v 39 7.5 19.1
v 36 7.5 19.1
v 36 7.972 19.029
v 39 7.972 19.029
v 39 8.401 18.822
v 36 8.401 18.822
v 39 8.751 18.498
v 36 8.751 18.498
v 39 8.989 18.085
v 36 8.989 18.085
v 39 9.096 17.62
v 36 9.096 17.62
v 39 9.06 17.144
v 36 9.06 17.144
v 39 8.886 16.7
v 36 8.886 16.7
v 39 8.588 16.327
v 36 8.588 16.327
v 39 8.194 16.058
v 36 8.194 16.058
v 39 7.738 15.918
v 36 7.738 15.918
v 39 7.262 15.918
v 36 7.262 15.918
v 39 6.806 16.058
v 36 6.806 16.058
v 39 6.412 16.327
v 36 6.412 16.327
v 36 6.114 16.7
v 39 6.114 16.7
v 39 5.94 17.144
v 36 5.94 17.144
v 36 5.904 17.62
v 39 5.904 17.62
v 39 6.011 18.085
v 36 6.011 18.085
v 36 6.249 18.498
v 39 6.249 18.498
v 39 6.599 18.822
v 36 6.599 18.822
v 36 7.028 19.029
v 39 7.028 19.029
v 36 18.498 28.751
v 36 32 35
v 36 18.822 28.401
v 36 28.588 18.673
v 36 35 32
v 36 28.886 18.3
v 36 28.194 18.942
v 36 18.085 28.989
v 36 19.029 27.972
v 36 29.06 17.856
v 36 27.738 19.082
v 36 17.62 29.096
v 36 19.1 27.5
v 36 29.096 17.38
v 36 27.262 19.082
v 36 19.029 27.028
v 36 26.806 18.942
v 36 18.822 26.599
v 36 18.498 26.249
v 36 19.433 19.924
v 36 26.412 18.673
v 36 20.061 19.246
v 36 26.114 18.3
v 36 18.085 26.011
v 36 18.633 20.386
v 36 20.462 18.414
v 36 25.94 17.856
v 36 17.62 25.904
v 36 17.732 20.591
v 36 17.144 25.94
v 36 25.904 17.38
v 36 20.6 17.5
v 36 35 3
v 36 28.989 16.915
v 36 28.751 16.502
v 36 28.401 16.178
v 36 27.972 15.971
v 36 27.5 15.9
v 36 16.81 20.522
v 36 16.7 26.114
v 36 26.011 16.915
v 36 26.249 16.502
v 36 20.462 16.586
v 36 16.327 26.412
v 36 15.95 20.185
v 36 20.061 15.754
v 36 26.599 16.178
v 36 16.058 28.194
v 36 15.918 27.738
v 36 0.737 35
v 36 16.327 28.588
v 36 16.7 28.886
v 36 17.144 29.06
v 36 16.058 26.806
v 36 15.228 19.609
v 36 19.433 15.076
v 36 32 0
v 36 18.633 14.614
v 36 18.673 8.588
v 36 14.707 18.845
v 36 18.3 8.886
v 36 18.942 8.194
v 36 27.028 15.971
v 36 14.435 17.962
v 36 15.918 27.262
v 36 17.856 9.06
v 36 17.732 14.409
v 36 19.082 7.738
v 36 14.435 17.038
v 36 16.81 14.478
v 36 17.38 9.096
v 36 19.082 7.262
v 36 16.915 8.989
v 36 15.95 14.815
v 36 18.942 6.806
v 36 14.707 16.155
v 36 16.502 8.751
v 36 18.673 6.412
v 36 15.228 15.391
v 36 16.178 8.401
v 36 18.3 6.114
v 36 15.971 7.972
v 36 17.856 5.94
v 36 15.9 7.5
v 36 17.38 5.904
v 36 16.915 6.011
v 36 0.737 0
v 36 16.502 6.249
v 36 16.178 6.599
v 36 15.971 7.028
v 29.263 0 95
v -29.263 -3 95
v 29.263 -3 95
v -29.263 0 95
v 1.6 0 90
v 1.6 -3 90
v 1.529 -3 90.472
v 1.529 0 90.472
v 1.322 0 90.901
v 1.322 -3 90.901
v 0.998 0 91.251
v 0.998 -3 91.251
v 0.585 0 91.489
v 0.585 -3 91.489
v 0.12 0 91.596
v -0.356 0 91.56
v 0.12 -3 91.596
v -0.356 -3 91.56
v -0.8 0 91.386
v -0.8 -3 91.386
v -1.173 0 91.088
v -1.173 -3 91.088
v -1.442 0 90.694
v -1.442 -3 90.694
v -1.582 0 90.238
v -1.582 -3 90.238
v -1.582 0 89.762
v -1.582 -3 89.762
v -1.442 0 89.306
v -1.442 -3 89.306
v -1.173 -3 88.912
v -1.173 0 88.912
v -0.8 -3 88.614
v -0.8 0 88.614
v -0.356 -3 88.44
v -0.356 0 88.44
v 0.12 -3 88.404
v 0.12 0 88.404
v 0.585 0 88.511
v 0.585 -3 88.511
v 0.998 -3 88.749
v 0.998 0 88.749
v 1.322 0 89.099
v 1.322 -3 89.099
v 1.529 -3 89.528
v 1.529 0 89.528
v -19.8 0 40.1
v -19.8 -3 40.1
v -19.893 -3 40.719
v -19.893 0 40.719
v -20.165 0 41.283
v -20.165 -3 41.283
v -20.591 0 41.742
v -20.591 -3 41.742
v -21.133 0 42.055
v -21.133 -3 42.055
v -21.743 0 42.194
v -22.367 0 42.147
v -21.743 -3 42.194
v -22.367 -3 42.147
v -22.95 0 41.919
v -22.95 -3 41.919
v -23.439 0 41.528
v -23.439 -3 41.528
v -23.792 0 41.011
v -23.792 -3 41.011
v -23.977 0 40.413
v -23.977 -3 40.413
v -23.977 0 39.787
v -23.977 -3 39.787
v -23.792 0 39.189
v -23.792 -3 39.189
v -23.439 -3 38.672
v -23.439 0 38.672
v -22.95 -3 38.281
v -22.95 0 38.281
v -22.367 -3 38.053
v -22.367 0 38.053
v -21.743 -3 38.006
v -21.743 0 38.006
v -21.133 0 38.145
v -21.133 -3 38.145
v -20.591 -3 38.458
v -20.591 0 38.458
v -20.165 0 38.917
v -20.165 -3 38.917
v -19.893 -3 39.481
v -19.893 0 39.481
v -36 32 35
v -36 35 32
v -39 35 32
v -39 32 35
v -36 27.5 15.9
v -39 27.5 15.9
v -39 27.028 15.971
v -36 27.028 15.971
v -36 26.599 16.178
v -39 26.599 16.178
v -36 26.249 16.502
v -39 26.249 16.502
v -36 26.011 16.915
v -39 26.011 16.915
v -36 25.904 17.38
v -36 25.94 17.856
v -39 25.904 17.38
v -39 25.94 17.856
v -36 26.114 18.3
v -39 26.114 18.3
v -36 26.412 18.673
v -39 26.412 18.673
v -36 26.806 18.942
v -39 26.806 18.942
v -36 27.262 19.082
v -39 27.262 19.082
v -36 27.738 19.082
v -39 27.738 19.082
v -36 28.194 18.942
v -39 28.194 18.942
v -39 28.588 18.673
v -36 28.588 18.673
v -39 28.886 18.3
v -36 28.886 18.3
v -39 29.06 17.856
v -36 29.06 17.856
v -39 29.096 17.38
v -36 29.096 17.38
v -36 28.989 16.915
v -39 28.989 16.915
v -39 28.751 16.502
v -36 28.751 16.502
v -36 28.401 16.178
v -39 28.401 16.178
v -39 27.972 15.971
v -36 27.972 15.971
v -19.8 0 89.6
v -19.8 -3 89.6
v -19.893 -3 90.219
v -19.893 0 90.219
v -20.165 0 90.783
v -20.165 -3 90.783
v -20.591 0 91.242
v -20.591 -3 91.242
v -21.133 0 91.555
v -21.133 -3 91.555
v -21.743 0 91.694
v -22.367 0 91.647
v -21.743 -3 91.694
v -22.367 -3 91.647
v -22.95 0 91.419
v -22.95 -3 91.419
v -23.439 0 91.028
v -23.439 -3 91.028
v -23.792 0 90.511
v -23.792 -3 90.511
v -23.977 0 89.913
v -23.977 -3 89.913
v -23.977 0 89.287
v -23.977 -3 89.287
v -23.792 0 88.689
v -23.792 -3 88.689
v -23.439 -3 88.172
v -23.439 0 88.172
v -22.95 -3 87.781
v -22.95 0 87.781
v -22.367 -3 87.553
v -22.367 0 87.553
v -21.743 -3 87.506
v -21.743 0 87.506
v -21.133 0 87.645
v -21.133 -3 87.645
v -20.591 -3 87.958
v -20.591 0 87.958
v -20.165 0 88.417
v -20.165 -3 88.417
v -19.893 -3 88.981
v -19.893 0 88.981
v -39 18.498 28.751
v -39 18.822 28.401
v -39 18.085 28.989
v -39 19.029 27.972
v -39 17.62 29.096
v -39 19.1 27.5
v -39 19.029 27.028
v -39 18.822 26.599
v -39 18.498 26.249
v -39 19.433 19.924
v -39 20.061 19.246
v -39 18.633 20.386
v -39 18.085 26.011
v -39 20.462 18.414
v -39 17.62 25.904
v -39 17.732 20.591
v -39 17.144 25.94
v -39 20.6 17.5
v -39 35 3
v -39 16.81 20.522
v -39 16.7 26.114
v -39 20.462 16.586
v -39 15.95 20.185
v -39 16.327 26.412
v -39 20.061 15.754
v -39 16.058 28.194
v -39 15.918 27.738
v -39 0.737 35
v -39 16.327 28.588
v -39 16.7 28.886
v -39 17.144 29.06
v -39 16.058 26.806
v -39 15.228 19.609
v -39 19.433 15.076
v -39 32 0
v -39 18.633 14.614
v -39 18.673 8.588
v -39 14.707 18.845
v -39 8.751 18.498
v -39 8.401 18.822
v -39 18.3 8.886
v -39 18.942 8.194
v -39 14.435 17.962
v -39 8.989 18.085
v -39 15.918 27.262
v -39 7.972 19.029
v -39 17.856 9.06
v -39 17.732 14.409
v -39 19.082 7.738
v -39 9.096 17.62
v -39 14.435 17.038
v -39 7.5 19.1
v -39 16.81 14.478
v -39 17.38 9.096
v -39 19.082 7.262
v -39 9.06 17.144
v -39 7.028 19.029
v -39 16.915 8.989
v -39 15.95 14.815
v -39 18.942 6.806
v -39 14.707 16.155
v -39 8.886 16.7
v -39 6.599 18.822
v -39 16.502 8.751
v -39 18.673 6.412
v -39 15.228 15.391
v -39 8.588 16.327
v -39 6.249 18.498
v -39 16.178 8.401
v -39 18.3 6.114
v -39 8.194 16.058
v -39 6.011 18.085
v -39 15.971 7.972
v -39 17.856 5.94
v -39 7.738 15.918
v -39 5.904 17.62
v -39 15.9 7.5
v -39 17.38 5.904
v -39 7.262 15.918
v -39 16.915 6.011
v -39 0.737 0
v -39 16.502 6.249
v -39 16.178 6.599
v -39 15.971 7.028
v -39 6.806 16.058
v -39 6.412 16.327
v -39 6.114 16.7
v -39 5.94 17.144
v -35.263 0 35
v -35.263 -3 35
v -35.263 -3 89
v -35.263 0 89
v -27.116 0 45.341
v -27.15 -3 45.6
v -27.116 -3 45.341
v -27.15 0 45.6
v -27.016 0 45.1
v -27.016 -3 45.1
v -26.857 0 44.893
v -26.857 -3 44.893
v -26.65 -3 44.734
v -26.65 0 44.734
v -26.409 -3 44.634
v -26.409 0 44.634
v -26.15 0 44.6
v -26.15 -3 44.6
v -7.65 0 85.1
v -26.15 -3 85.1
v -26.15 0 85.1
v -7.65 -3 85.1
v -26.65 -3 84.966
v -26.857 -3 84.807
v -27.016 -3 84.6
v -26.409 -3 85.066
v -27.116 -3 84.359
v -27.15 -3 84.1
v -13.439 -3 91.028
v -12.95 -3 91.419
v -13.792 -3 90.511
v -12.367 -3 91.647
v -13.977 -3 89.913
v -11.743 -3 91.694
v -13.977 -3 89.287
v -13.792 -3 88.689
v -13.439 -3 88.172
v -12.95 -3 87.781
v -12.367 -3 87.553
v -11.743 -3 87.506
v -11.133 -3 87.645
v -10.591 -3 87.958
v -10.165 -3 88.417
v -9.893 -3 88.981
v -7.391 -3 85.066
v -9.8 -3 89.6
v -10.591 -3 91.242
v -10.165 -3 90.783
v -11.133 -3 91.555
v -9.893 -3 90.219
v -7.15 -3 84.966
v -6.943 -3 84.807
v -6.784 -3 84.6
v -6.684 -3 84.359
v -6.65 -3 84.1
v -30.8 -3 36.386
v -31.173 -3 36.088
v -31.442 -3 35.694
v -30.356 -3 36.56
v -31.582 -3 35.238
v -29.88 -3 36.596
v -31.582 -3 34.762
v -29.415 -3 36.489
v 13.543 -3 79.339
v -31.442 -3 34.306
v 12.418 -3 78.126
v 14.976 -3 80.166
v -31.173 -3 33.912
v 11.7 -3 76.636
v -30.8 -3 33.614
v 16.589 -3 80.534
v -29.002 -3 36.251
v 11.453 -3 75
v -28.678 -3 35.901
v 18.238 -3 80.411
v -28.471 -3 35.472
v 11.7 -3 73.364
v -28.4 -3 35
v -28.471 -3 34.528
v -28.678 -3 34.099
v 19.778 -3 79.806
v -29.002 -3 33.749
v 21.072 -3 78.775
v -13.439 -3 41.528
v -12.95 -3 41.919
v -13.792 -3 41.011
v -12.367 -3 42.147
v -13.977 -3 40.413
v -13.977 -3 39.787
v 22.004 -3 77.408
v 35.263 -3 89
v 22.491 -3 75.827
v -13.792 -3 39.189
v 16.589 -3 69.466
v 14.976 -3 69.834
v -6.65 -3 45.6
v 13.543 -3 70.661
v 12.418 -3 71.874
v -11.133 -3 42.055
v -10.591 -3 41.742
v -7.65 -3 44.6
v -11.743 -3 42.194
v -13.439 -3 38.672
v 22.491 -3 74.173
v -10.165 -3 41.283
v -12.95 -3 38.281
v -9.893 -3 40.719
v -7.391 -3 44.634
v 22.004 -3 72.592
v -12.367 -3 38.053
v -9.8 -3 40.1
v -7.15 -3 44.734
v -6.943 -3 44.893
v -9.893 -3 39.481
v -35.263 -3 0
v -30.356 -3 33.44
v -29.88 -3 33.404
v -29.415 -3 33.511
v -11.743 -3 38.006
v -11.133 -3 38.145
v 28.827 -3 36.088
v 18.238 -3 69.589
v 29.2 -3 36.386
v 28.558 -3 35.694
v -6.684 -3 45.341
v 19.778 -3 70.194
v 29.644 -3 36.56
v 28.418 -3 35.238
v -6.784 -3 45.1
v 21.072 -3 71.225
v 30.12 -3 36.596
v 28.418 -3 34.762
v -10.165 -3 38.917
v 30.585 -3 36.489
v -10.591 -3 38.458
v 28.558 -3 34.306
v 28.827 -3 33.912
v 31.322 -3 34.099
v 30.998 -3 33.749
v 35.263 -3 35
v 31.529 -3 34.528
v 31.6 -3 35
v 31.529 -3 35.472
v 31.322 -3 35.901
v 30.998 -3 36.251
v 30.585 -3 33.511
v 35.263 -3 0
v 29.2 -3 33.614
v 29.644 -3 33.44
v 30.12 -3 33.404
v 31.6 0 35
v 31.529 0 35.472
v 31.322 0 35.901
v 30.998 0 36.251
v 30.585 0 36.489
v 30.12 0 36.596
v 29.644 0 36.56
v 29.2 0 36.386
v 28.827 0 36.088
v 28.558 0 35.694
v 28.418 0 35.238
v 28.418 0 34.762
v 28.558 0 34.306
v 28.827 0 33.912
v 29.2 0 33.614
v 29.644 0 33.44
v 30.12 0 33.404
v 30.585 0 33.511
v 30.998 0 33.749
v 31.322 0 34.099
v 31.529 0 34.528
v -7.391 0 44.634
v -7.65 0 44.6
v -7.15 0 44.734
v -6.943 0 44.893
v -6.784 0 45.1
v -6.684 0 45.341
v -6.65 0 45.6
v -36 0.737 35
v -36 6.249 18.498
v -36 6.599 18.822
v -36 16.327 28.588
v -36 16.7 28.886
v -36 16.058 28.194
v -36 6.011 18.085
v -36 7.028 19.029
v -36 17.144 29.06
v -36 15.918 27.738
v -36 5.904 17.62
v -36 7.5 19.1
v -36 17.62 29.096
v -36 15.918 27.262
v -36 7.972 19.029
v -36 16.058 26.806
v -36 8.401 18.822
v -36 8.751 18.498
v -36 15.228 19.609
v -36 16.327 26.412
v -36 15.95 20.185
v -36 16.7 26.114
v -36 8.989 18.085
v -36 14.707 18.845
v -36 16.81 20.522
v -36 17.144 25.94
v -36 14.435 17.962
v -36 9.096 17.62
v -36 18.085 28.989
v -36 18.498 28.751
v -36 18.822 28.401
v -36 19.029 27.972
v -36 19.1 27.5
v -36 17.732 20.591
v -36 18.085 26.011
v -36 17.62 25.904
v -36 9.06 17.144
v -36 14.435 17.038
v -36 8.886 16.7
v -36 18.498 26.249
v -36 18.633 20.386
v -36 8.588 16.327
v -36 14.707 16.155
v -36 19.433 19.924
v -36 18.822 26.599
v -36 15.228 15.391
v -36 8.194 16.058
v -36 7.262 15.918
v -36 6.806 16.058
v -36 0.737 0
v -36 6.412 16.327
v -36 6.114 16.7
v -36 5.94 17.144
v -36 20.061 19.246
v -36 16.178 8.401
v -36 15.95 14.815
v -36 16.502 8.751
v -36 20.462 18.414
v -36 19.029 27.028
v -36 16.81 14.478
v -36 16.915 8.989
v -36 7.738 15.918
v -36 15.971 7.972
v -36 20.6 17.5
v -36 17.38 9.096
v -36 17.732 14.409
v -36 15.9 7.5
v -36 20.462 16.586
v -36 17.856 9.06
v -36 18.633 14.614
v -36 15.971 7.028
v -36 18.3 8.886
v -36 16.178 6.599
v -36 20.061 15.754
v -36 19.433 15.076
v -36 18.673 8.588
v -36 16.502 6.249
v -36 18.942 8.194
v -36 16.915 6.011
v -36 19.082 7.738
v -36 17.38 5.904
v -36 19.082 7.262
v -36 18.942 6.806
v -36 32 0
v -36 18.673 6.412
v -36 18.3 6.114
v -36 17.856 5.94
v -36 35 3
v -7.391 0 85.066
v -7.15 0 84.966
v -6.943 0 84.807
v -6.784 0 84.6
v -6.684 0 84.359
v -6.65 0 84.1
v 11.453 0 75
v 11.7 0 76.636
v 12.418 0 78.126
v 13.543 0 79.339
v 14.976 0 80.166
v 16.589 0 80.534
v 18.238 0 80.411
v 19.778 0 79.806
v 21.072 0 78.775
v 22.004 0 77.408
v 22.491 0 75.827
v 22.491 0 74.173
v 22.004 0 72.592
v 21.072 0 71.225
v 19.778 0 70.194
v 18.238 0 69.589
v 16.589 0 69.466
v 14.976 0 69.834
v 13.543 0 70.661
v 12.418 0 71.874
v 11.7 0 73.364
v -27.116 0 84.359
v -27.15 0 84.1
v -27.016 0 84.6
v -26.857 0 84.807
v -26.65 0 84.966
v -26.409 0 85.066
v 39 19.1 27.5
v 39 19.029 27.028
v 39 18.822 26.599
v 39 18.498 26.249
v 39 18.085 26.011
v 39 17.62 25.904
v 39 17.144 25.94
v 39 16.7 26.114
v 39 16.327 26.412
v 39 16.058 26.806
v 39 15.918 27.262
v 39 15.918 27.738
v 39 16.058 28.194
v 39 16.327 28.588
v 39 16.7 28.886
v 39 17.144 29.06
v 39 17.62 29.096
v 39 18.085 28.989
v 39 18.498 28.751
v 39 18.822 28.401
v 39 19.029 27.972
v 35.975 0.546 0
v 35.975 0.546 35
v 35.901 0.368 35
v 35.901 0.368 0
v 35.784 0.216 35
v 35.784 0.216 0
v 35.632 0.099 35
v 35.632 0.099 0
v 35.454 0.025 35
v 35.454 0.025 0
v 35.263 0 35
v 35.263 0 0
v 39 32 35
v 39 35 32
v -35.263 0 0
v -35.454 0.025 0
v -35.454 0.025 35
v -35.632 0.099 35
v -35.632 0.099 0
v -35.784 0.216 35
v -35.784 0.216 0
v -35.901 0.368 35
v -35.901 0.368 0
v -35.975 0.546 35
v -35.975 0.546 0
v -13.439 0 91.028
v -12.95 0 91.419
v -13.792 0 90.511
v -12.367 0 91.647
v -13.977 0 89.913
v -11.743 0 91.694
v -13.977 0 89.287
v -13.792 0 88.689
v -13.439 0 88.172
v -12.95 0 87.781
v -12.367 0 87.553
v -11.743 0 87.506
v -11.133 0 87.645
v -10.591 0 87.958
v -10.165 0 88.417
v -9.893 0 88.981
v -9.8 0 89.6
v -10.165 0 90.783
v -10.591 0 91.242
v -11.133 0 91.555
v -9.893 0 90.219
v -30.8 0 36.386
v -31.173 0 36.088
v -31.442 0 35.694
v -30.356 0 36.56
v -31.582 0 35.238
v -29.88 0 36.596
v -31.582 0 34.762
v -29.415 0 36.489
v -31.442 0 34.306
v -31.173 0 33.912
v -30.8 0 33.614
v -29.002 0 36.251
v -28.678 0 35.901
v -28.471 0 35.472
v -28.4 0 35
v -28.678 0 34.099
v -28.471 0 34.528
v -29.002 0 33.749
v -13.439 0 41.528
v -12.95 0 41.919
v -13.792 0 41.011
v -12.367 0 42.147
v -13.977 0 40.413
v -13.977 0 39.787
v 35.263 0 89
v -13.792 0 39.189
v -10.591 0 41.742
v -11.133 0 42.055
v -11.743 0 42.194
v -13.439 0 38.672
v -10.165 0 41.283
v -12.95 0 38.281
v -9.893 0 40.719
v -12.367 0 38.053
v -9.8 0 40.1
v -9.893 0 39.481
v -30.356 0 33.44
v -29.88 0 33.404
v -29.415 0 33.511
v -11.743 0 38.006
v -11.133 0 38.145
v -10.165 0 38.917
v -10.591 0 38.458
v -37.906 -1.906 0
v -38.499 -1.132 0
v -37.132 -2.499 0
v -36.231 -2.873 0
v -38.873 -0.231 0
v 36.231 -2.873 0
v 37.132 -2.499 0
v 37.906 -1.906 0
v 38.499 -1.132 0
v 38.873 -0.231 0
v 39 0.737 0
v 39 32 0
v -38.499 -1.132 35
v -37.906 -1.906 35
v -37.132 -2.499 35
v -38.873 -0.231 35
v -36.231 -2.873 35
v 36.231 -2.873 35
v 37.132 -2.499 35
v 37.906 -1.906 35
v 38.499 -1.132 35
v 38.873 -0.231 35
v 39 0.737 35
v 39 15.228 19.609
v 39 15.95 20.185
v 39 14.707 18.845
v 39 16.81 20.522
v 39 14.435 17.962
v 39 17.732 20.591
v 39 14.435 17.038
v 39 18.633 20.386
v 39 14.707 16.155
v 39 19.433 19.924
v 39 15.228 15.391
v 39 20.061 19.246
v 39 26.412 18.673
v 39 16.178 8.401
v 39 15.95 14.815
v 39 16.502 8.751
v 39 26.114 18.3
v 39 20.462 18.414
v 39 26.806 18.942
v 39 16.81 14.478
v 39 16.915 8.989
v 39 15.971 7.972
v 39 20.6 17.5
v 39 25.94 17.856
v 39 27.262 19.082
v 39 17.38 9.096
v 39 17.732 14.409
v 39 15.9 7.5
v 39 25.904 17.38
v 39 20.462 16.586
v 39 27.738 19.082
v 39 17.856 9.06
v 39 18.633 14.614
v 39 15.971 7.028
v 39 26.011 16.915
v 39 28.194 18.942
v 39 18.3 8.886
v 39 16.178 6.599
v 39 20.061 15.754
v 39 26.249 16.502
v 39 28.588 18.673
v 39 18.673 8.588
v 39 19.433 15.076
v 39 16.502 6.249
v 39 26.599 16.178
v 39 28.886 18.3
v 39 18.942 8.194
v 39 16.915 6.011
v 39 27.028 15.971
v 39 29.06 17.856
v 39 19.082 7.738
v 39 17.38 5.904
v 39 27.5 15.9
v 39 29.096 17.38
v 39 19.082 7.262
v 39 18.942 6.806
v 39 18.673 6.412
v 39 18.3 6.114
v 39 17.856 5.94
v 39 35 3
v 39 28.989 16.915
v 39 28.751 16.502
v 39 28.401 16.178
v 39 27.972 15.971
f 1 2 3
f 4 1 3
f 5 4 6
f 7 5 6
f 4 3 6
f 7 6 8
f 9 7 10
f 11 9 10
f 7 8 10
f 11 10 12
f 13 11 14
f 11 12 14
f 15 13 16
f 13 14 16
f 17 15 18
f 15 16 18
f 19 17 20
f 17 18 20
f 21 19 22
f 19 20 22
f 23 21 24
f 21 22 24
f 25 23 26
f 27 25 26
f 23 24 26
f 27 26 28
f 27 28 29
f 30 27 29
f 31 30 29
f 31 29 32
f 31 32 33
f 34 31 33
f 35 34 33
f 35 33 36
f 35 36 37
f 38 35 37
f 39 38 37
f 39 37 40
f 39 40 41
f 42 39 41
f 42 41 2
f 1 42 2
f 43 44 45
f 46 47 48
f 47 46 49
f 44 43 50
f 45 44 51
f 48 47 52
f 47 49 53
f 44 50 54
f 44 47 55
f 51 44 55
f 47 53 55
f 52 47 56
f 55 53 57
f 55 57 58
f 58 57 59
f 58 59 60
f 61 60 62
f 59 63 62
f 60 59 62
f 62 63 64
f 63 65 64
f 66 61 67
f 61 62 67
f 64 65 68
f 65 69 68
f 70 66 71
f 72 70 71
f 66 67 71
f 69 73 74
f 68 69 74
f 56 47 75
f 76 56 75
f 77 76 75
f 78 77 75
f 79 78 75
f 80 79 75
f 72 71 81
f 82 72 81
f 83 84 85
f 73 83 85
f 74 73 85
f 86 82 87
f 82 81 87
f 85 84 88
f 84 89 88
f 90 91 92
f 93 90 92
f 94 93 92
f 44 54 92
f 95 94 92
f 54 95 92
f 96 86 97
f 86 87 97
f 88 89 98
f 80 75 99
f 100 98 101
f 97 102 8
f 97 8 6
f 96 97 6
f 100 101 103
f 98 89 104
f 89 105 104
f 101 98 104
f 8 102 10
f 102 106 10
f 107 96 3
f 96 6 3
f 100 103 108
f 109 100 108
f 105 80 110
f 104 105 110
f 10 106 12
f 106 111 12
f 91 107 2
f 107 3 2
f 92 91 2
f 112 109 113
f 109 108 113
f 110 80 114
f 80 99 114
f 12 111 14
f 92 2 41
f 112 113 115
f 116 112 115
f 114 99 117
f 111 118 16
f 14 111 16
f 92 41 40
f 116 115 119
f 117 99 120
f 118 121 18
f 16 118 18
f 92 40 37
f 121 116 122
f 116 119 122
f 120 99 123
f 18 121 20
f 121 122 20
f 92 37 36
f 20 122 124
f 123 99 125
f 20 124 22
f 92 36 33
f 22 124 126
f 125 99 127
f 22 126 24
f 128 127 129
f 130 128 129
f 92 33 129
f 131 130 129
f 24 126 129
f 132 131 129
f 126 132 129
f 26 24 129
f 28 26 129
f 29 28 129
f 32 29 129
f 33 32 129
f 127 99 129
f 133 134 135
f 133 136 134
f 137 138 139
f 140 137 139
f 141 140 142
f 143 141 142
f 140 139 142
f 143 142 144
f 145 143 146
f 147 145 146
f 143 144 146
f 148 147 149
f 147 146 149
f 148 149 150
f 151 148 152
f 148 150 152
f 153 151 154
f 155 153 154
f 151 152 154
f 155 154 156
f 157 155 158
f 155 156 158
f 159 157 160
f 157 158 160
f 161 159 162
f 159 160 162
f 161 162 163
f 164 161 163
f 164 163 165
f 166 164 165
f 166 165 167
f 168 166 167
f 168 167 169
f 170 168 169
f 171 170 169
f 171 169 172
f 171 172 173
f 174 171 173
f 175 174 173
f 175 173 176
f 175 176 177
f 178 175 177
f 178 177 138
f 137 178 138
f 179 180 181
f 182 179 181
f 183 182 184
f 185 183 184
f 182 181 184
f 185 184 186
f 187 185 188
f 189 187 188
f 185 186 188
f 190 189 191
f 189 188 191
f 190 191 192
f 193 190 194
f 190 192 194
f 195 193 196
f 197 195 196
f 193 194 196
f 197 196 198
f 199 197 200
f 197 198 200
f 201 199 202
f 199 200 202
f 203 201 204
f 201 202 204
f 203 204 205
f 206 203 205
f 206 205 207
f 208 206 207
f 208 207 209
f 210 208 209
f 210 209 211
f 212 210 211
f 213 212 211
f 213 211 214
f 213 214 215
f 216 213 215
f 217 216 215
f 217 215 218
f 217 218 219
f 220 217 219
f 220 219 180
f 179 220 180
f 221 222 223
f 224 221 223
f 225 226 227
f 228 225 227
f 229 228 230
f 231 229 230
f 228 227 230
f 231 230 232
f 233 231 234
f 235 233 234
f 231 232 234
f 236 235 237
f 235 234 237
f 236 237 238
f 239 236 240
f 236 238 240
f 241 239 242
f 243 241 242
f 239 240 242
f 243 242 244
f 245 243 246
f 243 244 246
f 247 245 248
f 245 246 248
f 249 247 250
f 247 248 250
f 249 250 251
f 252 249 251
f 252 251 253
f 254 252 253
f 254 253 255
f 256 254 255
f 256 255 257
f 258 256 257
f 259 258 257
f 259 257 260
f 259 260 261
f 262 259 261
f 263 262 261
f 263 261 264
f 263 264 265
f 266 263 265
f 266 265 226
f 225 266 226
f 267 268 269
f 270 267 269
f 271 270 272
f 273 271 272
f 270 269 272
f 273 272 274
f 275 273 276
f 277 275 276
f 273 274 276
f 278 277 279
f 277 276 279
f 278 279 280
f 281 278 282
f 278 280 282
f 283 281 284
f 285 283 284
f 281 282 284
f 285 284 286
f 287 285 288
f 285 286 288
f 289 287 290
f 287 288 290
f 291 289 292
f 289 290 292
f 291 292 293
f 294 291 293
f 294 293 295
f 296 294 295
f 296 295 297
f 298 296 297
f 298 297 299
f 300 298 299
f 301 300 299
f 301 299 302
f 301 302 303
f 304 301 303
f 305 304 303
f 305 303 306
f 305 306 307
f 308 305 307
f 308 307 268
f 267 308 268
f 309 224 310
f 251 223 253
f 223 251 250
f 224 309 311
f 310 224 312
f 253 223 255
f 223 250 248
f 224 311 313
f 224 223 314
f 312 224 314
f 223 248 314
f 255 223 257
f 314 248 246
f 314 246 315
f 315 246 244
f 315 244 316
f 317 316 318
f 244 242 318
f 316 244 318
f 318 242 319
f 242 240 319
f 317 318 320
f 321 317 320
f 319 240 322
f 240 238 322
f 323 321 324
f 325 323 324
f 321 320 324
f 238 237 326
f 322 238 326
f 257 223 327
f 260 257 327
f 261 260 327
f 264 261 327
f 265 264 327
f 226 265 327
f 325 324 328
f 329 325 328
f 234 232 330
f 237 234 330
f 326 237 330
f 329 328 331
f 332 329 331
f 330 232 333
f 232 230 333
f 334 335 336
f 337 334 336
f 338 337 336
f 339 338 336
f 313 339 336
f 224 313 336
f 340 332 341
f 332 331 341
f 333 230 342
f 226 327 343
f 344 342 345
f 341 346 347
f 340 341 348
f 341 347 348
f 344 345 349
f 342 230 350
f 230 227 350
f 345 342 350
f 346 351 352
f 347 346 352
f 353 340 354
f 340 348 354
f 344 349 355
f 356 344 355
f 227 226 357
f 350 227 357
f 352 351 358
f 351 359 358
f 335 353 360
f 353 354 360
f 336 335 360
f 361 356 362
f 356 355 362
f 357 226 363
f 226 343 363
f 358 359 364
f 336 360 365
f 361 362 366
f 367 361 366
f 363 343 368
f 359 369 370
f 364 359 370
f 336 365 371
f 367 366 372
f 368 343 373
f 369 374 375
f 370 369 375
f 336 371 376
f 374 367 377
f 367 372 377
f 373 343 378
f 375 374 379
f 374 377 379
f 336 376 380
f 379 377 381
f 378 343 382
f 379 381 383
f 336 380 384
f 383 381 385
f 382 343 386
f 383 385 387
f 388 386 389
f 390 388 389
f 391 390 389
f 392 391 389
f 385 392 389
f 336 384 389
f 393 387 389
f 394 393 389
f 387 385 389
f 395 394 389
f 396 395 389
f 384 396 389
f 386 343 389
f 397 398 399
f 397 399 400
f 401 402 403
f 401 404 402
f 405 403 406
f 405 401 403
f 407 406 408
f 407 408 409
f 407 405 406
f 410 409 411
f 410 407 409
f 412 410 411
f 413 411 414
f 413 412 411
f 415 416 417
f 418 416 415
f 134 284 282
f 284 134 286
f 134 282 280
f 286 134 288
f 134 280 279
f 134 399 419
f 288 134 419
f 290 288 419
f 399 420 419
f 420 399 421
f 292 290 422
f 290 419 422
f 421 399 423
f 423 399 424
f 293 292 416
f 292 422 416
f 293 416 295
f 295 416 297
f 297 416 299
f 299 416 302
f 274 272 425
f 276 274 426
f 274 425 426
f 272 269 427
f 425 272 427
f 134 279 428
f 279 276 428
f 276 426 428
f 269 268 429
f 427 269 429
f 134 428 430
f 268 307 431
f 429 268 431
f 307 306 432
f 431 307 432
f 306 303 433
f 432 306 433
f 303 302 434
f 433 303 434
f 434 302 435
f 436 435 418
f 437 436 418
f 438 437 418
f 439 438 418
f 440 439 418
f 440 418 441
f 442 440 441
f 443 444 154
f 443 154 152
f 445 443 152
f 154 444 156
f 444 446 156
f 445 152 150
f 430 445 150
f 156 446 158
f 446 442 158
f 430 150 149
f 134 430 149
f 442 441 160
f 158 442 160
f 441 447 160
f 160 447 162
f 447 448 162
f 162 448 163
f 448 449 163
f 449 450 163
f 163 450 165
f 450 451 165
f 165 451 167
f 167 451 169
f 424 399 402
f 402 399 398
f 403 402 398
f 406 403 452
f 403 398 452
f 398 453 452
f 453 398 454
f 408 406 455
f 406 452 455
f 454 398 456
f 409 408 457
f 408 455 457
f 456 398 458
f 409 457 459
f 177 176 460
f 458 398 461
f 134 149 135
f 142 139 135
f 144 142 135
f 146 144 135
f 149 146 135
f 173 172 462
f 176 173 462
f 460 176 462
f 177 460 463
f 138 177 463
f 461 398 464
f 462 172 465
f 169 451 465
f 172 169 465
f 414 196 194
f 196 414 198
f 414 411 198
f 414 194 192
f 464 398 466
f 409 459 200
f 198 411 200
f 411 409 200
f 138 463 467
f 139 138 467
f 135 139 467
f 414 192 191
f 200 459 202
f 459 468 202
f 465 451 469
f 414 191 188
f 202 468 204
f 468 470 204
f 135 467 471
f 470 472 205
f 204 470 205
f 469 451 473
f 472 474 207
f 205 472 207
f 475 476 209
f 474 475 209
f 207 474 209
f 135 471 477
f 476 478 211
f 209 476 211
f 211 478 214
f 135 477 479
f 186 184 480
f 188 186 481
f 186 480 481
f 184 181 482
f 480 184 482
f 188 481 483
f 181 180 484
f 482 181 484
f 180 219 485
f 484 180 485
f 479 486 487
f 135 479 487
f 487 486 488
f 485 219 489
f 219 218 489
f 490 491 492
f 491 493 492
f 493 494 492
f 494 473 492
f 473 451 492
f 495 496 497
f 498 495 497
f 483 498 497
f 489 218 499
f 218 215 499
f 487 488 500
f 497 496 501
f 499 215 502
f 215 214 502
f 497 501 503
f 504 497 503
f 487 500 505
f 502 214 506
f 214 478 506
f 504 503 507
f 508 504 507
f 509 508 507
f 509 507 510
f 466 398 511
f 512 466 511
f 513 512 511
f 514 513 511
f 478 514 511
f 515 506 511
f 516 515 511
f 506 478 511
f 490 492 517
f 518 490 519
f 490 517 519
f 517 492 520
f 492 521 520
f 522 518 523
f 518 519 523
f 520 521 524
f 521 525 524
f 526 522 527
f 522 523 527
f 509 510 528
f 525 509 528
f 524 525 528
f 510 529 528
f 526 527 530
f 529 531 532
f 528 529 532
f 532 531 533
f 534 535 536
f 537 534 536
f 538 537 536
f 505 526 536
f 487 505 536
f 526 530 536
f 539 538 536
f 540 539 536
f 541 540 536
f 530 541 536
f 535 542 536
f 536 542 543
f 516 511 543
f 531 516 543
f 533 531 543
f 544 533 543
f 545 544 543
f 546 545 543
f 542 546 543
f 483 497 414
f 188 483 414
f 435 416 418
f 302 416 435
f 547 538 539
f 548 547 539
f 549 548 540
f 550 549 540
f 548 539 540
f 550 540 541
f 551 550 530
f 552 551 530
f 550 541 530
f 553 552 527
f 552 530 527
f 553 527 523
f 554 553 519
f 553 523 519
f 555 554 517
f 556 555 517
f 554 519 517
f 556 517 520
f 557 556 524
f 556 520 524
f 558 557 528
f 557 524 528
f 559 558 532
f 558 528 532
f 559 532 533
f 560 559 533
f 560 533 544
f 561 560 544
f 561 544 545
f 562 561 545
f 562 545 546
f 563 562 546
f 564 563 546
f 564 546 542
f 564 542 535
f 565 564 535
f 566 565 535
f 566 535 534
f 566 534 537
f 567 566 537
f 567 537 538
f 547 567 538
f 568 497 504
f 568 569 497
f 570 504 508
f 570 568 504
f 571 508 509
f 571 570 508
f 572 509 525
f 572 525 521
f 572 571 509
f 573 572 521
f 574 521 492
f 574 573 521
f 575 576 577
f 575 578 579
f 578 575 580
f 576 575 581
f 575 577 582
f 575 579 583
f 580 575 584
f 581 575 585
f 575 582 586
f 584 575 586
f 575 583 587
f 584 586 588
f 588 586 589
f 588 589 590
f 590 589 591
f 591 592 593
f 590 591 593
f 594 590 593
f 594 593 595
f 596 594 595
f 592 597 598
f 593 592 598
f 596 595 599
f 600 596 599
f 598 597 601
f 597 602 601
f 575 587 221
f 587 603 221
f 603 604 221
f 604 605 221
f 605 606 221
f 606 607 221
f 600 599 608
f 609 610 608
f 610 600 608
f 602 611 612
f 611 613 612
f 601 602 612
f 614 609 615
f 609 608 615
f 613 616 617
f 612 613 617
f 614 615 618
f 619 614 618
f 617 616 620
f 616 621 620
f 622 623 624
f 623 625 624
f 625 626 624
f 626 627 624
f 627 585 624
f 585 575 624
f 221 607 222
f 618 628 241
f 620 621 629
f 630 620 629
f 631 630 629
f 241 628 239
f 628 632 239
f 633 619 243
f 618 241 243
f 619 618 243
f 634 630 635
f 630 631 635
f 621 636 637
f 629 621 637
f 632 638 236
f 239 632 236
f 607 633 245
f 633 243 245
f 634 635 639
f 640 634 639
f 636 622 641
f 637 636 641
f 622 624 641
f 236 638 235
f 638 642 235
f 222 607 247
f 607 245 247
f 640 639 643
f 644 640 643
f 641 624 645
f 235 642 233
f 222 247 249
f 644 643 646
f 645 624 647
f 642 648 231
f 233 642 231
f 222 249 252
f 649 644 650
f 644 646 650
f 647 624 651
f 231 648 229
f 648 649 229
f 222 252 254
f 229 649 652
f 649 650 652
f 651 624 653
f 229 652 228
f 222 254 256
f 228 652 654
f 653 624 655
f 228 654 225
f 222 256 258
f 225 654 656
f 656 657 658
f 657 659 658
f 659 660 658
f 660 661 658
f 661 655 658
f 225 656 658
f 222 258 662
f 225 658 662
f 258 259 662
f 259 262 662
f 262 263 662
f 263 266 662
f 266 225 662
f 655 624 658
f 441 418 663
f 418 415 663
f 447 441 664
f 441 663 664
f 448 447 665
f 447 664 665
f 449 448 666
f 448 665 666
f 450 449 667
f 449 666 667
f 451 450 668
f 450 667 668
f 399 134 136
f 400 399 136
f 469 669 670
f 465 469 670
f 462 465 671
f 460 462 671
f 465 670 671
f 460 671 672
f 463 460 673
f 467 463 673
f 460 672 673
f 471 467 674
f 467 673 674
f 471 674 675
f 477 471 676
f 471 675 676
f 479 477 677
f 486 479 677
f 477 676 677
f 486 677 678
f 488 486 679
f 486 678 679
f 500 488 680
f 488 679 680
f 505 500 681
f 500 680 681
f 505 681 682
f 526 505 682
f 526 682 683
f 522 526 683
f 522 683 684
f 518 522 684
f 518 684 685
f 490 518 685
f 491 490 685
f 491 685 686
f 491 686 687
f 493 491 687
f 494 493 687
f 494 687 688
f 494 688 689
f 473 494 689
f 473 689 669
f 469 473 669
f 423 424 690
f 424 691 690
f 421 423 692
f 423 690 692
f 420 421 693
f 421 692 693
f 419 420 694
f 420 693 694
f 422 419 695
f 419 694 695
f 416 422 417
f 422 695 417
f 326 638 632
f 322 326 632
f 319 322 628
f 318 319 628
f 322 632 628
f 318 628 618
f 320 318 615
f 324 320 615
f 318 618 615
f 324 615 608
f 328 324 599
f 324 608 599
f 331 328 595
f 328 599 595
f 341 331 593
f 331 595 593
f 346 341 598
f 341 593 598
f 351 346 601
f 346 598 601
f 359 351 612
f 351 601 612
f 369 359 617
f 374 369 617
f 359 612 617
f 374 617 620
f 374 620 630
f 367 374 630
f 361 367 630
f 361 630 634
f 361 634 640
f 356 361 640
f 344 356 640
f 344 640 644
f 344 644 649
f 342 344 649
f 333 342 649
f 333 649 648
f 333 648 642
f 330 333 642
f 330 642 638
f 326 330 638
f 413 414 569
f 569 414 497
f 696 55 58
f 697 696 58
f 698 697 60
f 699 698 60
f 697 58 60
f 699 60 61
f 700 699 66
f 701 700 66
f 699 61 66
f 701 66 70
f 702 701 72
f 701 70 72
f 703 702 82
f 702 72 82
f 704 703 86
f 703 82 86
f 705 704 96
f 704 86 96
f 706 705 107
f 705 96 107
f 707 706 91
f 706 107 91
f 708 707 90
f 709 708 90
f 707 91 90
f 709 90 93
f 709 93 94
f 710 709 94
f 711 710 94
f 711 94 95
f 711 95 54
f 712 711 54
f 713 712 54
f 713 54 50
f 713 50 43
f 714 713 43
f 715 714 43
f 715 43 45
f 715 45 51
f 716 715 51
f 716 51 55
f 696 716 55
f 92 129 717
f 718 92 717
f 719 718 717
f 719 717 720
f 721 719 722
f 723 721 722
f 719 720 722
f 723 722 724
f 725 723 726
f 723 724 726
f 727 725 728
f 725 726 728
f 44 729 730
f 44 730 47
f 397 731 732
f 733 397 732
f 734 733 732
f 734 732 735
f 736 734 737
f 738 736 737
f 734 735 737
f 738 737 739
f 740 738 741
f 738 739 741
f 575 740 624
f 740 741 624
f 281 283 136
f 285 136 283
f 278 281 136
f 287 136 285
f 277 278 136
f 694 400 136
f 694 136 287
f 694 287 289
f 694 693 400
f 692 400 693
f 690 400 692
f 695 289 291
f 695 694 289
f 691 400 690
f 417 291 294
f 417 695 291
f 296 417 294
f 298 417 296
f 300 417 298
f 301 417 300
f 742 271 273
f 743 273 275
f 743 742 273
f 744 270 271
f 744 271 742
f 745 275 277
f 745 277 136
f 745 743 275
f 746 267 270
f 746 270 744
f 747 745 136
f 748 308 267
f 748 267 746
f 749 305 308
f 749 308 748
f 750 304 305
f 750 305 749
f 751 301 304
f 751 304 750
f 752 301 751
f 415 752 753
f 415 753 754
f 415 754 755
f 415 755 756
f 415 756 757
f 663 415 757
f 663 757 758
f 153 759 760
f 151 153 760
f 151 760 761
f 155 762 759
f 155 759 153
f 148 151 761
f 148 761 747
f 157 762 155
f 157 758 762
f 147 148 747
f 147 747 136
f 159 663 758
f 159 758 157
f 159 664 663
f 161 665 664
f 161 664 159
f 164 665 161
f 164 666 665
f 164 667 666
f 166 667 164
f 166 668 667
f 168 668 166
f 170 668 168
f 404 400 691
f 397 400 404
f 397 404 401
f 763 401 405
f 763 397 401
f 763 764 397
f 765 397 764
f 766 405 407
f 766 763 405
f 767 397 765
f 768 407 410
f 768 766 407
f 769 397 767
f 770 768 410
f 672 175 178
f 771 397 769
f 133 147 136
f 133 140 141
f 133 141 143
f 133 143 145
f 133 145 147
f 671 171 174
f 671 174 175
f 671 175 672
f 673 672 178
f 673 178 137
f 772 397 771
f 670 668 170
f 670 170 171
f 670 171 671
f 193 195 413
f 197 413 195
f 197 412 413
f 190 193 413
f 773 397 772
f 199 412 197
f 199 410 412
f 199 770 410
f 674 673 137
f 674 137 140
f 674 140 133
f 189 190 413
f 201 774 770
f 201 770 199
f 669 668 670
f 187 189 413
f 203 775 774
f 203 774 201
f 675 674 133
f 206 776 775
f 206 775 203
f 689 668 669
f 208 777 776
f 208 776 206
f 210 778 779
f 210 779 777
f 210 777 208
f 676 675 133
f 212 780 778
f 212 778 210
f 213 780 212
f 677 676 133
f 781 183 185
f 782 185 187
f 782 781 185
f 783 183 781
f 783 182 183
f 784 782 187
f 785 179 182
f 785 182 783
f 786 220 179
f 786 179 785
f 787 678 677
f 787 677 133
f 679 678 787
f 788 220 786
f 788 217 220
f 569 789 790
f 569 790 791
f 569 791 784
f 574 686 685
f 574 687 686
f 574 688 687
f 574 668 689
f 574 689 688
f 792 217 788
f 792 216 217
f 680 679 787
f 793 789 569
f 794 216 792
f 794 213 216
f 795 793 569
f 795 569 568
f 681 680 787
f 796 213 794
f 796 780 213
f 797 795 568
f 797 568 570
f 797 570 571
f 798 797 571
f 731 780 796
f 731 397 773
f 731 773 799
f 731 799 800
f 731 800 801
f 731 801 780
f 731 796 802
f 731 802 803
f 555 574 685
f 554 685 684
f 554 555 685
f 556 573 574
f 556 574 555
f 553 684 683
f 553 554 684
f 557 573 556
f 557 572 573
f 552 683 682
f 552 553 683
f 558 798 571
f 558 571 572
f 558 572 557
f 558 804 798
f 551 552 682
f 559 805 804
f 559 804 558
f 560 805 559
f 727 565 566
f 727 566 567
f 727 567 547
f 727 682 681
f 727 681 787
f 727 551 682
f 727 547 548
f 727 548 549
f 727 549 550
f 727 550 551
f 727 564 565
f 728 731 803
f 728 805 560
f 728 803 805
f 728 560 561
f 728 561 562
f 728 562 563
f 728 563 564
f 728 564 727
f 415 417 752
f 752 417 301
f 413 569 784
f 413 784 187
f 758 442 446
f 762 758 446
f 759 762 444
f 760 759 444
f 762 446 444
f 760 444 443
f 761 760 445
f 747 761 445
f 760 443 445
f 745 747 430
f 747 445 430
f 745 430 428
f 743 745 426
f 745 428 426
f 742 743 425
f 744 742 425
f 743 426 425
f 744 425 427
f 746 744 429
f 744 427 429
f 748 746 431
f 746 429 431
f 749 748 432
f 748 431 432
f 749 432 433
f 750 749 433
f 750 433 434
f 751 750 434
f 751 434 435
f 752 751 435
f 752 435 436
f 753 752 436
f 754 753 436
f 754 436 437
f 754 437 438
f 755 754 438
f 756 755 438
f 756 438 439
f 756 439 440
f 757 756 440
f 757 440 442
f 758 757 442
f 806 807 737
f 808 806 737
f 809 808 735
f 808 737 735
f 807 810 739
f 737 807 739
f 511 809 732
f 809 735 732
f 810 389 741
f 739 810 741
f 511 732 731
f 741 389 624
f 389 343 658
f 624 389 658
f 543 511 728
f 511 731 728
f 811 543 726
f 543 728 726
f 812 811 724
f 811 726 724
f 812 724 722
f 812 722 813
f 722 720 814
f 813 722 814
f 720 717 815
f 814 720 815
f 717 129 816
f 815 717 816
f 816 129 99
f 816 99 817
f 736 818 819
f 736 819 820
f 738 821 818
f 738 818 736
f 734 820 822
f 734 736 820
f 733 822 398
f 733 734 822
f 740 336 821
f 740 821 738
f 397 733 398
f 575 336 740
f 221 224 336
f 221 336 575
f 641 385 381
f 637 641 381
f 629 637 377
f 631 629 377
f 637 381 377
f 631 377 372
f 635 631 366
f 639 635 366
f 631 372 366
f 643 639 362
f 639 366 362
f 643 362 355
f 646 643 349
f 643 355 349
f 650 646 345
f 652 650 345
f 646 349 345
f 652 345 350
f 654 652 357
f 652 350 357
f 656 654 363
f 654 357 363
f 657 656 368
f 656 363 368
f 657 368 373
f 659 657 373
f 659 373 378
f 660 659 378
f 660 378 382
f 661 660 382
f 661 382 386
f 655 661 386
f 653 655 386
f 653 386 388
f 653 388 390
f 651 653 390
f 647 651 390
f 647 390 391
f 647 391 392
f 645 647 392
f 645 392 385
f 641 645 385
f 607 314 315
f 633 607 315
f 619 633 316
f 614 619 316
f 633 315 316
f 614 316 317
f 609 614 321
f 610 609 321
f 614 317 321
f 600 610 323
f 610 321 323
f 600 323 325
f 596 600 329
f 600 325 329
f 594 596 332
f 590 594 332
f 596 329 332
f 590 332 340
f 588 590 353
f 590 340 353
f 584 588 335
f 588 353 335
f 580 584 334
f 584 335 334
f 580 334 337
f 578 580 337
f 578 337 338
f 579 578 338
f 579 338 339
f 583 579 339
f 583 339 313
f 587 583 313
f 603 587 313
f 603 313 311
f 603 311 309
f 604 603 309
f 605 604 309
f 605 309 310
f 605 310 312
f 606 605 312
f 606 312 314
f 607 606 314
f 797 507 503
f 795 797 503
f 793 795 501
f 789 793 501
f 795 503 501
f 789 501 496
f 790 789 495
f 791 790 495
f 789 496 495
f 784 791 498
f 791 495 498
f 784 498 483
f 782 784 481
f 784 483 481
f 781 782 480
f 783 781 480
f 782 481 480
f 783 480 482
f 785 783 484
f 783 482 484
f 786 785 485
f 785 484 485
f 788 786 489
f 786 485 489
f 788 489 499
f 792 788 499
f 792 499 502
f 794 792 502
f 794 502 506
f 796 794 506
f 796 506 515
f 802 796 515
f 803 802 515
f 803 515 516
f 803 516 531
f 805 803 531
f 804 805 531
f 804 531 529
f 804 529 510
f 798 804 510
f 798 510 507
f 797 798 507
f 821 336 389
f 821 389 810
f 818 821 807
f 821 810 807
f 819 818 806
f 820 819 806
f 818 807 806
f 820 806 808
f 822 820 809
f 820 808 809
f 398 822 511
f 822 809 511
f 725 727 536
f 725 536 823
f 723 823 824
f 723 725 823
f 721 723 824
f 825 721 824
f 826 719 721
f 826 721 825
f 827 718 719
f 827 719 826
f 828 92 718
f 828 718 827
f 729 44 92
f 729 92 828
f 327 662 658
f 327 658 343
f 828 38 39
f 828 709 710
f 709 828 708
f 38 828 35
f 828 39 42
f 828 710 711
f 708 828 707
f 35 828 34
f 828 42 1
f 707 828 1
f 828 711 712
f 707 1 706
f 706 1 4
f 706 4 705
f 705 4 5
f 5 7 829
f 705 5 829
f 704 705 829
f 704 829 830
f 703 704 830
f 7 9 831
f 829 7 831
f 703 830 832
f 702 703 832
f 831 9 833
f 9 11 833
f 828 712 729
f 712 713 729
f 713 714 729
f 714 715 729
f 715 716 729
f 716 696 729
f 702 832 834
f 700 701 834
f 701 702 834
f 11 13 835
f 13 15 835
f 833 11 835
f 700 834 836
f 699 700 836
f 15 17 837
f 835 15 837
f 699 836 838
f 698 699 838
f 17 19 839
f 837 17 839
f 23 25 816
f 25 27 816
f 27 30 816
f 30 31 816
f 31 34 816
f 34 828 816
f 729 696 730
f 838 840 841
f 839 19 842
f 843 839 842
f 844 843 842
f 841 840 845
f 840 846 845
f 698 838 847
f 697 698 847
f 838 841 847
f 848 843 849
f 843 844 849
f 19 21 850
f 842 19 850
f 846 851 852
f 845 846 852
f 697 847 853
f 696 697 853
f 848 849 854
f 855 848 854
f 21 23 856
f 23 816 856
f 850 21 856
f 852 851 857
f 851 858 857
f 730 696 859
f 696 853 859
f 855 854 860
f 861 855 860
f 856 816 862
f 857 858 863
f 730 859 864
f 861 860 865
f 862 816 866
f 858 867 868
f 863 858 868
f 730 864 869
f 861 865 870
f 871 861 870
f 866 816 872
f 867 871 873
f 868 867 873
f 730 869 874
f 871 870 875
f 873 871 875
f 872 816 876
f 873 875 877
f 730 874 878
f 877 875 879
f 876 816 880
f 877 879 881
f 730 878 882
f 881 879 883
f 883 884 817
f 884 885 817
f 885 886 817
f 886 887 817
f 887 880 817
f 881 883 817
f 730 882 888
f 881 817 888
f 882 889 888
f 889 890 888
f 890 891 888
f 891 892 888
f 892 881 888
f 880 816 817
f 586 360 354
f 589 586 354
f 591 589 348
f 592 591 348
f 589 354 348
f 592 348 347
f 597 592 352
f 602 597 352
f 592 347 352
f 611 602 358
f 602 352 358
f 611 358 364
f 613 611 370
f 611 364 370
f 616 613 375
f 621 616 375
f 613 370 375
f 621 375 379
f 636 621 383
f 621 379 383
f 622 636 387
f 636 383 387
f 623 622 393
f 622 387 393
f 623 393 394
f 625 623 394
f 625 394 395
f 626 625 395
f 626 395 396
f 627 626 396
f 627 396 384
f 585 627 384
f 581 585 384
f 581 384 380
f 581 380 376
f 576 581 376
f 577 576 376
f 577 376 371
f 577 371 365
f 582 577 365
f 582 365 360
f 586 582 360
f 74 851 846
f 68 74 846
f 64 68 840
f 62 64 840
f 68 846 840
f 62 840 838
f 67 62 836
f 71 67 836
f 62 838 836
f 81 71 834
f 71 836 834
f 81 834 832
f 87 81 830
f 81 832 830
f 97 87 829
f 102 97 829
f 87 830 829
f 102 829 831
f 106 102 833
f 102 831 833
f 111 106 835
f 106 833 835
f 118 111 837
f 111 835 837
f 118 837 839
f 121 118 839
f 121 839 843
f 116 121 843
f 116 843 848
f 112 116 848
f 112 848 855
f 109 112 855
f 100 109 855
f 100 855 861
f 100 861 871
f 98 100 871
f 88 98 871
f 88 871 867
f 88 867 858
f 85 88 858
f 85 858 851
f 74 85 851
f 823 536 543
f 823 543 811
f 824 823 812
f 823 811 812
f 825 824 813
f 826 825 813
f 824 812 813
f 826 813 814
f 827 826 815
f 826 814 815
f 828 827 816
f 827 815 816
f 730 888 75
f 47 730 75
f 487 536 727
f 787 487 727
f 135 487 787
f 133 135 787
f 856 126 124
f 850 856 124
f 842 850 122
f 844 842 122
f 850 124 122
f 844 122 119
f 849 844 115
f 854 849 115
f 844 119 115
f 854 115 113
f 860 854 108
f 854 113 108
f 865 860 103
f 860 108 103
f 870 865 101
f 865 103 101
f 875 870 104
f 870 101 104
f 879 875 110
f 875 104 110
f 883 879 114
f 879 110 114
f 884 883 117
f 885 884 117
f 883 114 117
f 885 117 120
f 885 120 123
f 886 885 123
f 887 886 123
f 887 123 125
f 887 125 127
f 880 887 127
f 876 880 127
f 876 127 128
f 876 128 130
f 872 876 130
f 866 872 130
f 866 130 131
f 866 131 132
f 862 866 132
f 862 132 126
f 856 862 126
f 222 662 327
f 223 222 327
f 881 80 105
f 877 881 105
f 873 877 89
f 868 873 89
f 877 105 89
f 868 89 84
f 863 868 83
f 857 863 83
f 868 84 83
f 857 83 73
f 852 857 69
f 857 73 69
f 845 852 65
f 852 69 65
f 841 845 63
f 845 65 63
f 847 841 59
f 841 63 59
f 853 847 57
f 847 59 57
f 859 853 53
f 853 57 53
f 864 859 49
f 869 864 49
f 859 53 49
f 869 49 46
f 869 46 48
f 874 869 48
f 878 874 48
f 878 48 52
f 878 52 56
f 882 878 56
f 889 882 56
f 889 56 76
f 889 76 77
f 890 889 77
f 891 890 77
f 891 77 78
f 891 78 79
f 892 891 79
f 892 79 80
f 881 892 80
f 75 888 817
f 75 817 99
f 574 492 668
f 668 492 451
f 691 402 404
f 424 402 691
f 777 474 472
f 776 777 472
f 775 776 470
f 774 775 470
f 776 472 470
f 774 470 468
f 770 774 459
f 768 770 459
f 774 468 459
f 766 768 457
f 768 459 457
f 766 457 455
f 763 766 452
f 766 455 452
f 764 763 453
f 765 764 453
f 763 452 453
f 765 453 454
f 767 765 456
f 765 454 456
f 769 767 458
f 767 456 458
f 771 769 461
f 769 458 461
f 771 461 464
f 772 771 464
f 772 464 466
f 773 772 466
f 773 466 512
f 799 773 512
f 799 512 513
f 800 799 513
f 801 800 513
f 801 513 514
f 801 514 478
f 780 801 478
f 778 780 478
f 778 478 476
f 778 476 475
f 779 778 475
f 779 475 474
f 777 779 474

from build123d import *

# Parameters (mm, degrees)
SM_BASE_FLANGE_1_DEPTH      = 35
SKETCH_7_W                  = 70.5268
SKETCH_7_H                  = 3
EXTRUDE_1_DEPTH             = 60
SKETCH_8_R                  = 3.1
CUT_EXTRUDE_1_DEPTH         = 128.804538261
SKETCH_9_R                  = 1.6
CUT_EXTRUDE_2_DEPTH         = 128.804538261
PATTERN_CIRCULAR_1_COUNT    = 4
SKETCH_10_W                 = 20.5
SKETCH_10_H                 = 40.5
CUT_EXTRUDE_3_DEPTH         = 110.498858442
SKETCH_11_R                 = 2.1
CUT_EXTRUDE_4_DEPTH         = 110.498858442
PATTERN_LINEAR_1_COUNT      = 2
PATTERN_LINEAR_1_PITCH      = 10
PATTERN_LINEAR_1_COUNT_DIR2 = 2
PATTERN_LINEAR_1_PITCH_DIR2 = 49.5
SKETCH_14_R                 = 5.55
CUT_EXTRUDE_7_DEPTH         = 109.494239478
FILLET_1_R                  = 1
CHAMFER_4_SIZE              = 3
CHAMFER_5_SIZE              = 6
SKETCH_15_R                 = 1.6
CUT_EXTRUDE_8_DEPTH         = 110.498858442
SKETCH_16_R                 = 1.6
CUT_EXTRUDE_9_DEPTH         = 110.498858442
PATTERN_LINEAR_2_COUNT      = 2
PATTERN_LINEAR_2_PITCH      = 60


# Sheet-metal steps are written as plain solids
with BuildPart() as part:
    # Sketch 2 → 基材-凸緣1 (new body)
    with BuildSketch(Plane.XY):
        with BuildLine():
            Line((36, 35), (36, 0.7366))
            ThreePointArc((36, 0.7366), (35.784254855, 0.215745145), (35.2634, 0))
            Line((35.2634, 0), (-35.2634, 0))
            ThreePointArc((-35.2634, 0), (-35.784254855, 0.215745145), (-36, 0.7366))
            Line((-36, 0.7366), (-36, 35))
            Line((-36, 35), (-39, 35))
            Line((-39, 35), (-39, 0.7366))
            ThreePointArc((-39, 0.7366), (-37.905575199, -1.905575199), (-35.2634, -3))
            Line((-35.2634, -3), (35.2634, -3))
            ThreePointArc((35.2634, -3), (37.905575199, -1.905575199), (39, 0.7366))
            Line((39, 0.7366), (39, 35))
            Line((39, 35), (36, 35))
        make_face()
    extrude(amount=SM_BASE_FLANGE_1_DEPTH)

    # 草圖7 → 填料-伸長1 (add)
    with BuildSketch(Plane.XY.offset(35)):
        with Locations((0, -1.5)):
            Rectangle(SKETCH_7_W, SKETCH_7_H)
    extrude(amount=EXTRUDE_1_DEPTH)

    # 草圖8 → 除料-伸長1 (cut, through all)
    with BuildSketch(Plane(origin=(39, 0, 0), x_dir=(0, 0, -1), z_dir=(1, 0, 0))):
        with Locations(Location((-17.5, 17.5, 0), (0, 0, 90))):
            Circle(SKETCH_8_R)
    extrude(amount=-CUT_EXTRUDE_1_DEPTH, mode=Mode.SUBTRACT)

    # 草圖9 → 除料-伸長2 (cut, through all)
    with BuildSketch(Plane.ZY.offset(39)):
        with Locations((17.5, 7.5)):
            Circle(SKETCH_9_R)
    cut_extrude_2 = extrude(amount=-CUT_EXTRUDE_2_DEPTH, mode=Mode.SUBTRACT)

    # 環狀複製排列1: 除料-伸長2 ×4 about axis
    pattern_circular_1_axis = Axis((0, 17.5, 17.5), (1, 0, 0))
    for i in range(1, PATTERN_CIRCULAR_1_COUNT):
        add(cut_extrude_2.rotate(pattern_circular_1_axis, i * 360 / PATTERN_CIRCULAR_1_COUNT), mode=Mode.SUBTRACT)

    # 草圖10 → 除料-伸長3 (cut, through all)
    with BuildSketch(Plane.XZ.offset(3)):
        with Locations((-16.9, 64.85)):
            Rectangle(SKETCH_10_W, SKETCH_10_H)
    extrude(amount=-CUT_EXTRUDE_3_DEPTH, mode=Mode.SUBTRACT)

    # 草圖11 → 除料-伸長4 (cut, through all)
    with BuildSketch(Plane.XZ.offset(3)):
        with Locations((-21.9, 89.6)):
            Circle(SKETCH_11_R)
    cut_extrude_4 = extrude(amount=-CUT_EXTRUDE_4_DEPTH, mode=Mode.SUBTRACT)

    # 直線複製排列1: Cut-Extrude 4 2 × 2
    with Locations(*[(i * PATTERN_LINEAR_1_PITCH, 0, -j * PATTERN_LINEAR_1_PITCH_DIR2) for i in range(PATTERN_LINEAR_1_COUNT) for j in range(PATTERN_LINEAR_1_COUNT_DIR2) if (i, j) != (0, 0)]):
        add(cut_extrude_4, mode=Mode.SUBTRACT)

    # 草圖14 → 除料-伸長7 (cut, through all)
    with BuildSketch(Plane(origin=(0, 0, 0), x_dir=(1, 0, 0), z_dir=(0, 1, 0))):
        with Locations(Location((17.0034, -75, 0), (0, 0, 180))):
            Circle(SKETCH_14_R)
    extrude(amount=-CUT_EXTRUDE_7_DEPTH, mode=Mode.SUBTRACT)

    # 圓角1
    fillet_1_edges = [part.edges().sort_by_distance(p)[0] for p in [
        (-6.65, -1.5, 85.1),
        (-6.65, -1.5, 44.6),
        (-27.15, -1.5, 44.6),
        (-27.15, -1.5, 85.1),
    ]]
    fillet(fillet_1_edges, radius=FILLET_1_R)

    # 導角4
    chamfer_4_edges = [part.edges().sort_by_distance(p)[0] for p in [
        (-37.5, 35, 0),
        (37.5, 35, 0),
        (-37.5, 35, 35),
        (37.5, 35, 35),
    ]]
    chamfer(chamfer_4_edges, length=CHAMFER_4_SIZE)

    # 導角5
    chamfer_5_edges = [part.edges().sort_by_distance(p)[0] for p in [
        (35.2634, -1.5, 95),
        (-35.2634, -1.5, 95),
    ]]
    chamfer(chamfer_5_edges, length=CHAMFER_5_SIZE)

    # 草圖15 → 除料-伸長8 (cut, through all)
    with BuildSketch(Plane.XZ.offset(3)):
        with Locations((0, 90)):
            Circle(SKETCH_15_R)
    extrude(amount=-CUT_EXTRUDE_8_DEPTH, mode=Mode.SUBTRACT)

    # 草圖16 → 除料-伸長9 (cut, through all)
    with BuildSketch(Plane.XZ.offset(3)):
        with Locations((30, 35)):
            Circle(SKETCH_16_R)
    cut_extrude_9 = extrude(amount=-CUT_EXTRUDE_9_DEPTH, mode=Mode.SUBTRACT)

    # 直線複製排列2: 除料-伸長9 ×2
    with Locations(*[(-i * PATTERN_LINEAR_2_PITCH, 0, 0) for i in range(1, PATTERN_LINEAR_2_COUNT)]):
        add(cut_extrude_9, mode=Mode.SUBTRACT)


solid = part.part
